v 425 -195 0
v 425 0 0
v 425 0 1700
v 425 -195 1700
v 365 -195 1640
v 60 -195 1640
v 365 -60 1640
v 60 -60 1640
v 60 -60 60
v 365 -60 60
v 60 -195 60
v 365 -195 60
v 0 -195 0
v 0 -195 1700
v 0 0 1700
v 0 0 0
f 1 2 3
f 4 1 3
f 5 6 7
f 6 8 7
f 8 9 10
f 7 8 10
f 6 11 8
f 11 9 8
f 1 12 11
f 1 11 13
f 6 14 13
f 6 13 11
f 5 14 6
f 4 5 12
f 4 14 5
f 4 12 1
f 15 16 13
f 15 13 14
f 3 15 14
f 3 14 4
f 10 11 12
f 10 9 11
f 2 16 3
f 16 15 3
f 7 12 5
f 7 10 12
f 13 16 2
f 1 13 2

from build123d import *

# Parameters (mm, degrees)
F0_W     = 45.5373488367
F0_H     = 44.1119857132
F1_DEPTH = 195
F2_DEPTH = 1700
F3_DEPTH = 425
F4_T     = -60


with BuildPart() as f1:
    # F0 (on Front) → F1 (new body)
    with BuildSketch(Plane.XZ):
        with Locations((22.7686744183, 22.0559928566)):
            Rectangle(F0_W, F0_H)
    extrude(amount=F1_DEPTH)

    # F2 (add): a face of the model
    f2_faces = [f1.faces().sort_by_distance(p)[0] for p in [
        (22.7686744183, -97.5, 0),
    ]]
    extrude(f2_faces, amount=-F2_DEPTH)

    # F3 (add): a face of the model
    f3_faces = [f1.faces().sort_by_distance(p)[0] for p in [
        (0, -97.5, 850),
    ]]
    extrude(f3_faces, amount=-F3_DEPTH)

    # F4
    f4_openings = [f1.faces().sort_by_distance(p)[0] for p in [
        (212.5, -195, 850),
    ]]
    offset(amount=F4_T, openings=f4_openings)


solid = f1.part
